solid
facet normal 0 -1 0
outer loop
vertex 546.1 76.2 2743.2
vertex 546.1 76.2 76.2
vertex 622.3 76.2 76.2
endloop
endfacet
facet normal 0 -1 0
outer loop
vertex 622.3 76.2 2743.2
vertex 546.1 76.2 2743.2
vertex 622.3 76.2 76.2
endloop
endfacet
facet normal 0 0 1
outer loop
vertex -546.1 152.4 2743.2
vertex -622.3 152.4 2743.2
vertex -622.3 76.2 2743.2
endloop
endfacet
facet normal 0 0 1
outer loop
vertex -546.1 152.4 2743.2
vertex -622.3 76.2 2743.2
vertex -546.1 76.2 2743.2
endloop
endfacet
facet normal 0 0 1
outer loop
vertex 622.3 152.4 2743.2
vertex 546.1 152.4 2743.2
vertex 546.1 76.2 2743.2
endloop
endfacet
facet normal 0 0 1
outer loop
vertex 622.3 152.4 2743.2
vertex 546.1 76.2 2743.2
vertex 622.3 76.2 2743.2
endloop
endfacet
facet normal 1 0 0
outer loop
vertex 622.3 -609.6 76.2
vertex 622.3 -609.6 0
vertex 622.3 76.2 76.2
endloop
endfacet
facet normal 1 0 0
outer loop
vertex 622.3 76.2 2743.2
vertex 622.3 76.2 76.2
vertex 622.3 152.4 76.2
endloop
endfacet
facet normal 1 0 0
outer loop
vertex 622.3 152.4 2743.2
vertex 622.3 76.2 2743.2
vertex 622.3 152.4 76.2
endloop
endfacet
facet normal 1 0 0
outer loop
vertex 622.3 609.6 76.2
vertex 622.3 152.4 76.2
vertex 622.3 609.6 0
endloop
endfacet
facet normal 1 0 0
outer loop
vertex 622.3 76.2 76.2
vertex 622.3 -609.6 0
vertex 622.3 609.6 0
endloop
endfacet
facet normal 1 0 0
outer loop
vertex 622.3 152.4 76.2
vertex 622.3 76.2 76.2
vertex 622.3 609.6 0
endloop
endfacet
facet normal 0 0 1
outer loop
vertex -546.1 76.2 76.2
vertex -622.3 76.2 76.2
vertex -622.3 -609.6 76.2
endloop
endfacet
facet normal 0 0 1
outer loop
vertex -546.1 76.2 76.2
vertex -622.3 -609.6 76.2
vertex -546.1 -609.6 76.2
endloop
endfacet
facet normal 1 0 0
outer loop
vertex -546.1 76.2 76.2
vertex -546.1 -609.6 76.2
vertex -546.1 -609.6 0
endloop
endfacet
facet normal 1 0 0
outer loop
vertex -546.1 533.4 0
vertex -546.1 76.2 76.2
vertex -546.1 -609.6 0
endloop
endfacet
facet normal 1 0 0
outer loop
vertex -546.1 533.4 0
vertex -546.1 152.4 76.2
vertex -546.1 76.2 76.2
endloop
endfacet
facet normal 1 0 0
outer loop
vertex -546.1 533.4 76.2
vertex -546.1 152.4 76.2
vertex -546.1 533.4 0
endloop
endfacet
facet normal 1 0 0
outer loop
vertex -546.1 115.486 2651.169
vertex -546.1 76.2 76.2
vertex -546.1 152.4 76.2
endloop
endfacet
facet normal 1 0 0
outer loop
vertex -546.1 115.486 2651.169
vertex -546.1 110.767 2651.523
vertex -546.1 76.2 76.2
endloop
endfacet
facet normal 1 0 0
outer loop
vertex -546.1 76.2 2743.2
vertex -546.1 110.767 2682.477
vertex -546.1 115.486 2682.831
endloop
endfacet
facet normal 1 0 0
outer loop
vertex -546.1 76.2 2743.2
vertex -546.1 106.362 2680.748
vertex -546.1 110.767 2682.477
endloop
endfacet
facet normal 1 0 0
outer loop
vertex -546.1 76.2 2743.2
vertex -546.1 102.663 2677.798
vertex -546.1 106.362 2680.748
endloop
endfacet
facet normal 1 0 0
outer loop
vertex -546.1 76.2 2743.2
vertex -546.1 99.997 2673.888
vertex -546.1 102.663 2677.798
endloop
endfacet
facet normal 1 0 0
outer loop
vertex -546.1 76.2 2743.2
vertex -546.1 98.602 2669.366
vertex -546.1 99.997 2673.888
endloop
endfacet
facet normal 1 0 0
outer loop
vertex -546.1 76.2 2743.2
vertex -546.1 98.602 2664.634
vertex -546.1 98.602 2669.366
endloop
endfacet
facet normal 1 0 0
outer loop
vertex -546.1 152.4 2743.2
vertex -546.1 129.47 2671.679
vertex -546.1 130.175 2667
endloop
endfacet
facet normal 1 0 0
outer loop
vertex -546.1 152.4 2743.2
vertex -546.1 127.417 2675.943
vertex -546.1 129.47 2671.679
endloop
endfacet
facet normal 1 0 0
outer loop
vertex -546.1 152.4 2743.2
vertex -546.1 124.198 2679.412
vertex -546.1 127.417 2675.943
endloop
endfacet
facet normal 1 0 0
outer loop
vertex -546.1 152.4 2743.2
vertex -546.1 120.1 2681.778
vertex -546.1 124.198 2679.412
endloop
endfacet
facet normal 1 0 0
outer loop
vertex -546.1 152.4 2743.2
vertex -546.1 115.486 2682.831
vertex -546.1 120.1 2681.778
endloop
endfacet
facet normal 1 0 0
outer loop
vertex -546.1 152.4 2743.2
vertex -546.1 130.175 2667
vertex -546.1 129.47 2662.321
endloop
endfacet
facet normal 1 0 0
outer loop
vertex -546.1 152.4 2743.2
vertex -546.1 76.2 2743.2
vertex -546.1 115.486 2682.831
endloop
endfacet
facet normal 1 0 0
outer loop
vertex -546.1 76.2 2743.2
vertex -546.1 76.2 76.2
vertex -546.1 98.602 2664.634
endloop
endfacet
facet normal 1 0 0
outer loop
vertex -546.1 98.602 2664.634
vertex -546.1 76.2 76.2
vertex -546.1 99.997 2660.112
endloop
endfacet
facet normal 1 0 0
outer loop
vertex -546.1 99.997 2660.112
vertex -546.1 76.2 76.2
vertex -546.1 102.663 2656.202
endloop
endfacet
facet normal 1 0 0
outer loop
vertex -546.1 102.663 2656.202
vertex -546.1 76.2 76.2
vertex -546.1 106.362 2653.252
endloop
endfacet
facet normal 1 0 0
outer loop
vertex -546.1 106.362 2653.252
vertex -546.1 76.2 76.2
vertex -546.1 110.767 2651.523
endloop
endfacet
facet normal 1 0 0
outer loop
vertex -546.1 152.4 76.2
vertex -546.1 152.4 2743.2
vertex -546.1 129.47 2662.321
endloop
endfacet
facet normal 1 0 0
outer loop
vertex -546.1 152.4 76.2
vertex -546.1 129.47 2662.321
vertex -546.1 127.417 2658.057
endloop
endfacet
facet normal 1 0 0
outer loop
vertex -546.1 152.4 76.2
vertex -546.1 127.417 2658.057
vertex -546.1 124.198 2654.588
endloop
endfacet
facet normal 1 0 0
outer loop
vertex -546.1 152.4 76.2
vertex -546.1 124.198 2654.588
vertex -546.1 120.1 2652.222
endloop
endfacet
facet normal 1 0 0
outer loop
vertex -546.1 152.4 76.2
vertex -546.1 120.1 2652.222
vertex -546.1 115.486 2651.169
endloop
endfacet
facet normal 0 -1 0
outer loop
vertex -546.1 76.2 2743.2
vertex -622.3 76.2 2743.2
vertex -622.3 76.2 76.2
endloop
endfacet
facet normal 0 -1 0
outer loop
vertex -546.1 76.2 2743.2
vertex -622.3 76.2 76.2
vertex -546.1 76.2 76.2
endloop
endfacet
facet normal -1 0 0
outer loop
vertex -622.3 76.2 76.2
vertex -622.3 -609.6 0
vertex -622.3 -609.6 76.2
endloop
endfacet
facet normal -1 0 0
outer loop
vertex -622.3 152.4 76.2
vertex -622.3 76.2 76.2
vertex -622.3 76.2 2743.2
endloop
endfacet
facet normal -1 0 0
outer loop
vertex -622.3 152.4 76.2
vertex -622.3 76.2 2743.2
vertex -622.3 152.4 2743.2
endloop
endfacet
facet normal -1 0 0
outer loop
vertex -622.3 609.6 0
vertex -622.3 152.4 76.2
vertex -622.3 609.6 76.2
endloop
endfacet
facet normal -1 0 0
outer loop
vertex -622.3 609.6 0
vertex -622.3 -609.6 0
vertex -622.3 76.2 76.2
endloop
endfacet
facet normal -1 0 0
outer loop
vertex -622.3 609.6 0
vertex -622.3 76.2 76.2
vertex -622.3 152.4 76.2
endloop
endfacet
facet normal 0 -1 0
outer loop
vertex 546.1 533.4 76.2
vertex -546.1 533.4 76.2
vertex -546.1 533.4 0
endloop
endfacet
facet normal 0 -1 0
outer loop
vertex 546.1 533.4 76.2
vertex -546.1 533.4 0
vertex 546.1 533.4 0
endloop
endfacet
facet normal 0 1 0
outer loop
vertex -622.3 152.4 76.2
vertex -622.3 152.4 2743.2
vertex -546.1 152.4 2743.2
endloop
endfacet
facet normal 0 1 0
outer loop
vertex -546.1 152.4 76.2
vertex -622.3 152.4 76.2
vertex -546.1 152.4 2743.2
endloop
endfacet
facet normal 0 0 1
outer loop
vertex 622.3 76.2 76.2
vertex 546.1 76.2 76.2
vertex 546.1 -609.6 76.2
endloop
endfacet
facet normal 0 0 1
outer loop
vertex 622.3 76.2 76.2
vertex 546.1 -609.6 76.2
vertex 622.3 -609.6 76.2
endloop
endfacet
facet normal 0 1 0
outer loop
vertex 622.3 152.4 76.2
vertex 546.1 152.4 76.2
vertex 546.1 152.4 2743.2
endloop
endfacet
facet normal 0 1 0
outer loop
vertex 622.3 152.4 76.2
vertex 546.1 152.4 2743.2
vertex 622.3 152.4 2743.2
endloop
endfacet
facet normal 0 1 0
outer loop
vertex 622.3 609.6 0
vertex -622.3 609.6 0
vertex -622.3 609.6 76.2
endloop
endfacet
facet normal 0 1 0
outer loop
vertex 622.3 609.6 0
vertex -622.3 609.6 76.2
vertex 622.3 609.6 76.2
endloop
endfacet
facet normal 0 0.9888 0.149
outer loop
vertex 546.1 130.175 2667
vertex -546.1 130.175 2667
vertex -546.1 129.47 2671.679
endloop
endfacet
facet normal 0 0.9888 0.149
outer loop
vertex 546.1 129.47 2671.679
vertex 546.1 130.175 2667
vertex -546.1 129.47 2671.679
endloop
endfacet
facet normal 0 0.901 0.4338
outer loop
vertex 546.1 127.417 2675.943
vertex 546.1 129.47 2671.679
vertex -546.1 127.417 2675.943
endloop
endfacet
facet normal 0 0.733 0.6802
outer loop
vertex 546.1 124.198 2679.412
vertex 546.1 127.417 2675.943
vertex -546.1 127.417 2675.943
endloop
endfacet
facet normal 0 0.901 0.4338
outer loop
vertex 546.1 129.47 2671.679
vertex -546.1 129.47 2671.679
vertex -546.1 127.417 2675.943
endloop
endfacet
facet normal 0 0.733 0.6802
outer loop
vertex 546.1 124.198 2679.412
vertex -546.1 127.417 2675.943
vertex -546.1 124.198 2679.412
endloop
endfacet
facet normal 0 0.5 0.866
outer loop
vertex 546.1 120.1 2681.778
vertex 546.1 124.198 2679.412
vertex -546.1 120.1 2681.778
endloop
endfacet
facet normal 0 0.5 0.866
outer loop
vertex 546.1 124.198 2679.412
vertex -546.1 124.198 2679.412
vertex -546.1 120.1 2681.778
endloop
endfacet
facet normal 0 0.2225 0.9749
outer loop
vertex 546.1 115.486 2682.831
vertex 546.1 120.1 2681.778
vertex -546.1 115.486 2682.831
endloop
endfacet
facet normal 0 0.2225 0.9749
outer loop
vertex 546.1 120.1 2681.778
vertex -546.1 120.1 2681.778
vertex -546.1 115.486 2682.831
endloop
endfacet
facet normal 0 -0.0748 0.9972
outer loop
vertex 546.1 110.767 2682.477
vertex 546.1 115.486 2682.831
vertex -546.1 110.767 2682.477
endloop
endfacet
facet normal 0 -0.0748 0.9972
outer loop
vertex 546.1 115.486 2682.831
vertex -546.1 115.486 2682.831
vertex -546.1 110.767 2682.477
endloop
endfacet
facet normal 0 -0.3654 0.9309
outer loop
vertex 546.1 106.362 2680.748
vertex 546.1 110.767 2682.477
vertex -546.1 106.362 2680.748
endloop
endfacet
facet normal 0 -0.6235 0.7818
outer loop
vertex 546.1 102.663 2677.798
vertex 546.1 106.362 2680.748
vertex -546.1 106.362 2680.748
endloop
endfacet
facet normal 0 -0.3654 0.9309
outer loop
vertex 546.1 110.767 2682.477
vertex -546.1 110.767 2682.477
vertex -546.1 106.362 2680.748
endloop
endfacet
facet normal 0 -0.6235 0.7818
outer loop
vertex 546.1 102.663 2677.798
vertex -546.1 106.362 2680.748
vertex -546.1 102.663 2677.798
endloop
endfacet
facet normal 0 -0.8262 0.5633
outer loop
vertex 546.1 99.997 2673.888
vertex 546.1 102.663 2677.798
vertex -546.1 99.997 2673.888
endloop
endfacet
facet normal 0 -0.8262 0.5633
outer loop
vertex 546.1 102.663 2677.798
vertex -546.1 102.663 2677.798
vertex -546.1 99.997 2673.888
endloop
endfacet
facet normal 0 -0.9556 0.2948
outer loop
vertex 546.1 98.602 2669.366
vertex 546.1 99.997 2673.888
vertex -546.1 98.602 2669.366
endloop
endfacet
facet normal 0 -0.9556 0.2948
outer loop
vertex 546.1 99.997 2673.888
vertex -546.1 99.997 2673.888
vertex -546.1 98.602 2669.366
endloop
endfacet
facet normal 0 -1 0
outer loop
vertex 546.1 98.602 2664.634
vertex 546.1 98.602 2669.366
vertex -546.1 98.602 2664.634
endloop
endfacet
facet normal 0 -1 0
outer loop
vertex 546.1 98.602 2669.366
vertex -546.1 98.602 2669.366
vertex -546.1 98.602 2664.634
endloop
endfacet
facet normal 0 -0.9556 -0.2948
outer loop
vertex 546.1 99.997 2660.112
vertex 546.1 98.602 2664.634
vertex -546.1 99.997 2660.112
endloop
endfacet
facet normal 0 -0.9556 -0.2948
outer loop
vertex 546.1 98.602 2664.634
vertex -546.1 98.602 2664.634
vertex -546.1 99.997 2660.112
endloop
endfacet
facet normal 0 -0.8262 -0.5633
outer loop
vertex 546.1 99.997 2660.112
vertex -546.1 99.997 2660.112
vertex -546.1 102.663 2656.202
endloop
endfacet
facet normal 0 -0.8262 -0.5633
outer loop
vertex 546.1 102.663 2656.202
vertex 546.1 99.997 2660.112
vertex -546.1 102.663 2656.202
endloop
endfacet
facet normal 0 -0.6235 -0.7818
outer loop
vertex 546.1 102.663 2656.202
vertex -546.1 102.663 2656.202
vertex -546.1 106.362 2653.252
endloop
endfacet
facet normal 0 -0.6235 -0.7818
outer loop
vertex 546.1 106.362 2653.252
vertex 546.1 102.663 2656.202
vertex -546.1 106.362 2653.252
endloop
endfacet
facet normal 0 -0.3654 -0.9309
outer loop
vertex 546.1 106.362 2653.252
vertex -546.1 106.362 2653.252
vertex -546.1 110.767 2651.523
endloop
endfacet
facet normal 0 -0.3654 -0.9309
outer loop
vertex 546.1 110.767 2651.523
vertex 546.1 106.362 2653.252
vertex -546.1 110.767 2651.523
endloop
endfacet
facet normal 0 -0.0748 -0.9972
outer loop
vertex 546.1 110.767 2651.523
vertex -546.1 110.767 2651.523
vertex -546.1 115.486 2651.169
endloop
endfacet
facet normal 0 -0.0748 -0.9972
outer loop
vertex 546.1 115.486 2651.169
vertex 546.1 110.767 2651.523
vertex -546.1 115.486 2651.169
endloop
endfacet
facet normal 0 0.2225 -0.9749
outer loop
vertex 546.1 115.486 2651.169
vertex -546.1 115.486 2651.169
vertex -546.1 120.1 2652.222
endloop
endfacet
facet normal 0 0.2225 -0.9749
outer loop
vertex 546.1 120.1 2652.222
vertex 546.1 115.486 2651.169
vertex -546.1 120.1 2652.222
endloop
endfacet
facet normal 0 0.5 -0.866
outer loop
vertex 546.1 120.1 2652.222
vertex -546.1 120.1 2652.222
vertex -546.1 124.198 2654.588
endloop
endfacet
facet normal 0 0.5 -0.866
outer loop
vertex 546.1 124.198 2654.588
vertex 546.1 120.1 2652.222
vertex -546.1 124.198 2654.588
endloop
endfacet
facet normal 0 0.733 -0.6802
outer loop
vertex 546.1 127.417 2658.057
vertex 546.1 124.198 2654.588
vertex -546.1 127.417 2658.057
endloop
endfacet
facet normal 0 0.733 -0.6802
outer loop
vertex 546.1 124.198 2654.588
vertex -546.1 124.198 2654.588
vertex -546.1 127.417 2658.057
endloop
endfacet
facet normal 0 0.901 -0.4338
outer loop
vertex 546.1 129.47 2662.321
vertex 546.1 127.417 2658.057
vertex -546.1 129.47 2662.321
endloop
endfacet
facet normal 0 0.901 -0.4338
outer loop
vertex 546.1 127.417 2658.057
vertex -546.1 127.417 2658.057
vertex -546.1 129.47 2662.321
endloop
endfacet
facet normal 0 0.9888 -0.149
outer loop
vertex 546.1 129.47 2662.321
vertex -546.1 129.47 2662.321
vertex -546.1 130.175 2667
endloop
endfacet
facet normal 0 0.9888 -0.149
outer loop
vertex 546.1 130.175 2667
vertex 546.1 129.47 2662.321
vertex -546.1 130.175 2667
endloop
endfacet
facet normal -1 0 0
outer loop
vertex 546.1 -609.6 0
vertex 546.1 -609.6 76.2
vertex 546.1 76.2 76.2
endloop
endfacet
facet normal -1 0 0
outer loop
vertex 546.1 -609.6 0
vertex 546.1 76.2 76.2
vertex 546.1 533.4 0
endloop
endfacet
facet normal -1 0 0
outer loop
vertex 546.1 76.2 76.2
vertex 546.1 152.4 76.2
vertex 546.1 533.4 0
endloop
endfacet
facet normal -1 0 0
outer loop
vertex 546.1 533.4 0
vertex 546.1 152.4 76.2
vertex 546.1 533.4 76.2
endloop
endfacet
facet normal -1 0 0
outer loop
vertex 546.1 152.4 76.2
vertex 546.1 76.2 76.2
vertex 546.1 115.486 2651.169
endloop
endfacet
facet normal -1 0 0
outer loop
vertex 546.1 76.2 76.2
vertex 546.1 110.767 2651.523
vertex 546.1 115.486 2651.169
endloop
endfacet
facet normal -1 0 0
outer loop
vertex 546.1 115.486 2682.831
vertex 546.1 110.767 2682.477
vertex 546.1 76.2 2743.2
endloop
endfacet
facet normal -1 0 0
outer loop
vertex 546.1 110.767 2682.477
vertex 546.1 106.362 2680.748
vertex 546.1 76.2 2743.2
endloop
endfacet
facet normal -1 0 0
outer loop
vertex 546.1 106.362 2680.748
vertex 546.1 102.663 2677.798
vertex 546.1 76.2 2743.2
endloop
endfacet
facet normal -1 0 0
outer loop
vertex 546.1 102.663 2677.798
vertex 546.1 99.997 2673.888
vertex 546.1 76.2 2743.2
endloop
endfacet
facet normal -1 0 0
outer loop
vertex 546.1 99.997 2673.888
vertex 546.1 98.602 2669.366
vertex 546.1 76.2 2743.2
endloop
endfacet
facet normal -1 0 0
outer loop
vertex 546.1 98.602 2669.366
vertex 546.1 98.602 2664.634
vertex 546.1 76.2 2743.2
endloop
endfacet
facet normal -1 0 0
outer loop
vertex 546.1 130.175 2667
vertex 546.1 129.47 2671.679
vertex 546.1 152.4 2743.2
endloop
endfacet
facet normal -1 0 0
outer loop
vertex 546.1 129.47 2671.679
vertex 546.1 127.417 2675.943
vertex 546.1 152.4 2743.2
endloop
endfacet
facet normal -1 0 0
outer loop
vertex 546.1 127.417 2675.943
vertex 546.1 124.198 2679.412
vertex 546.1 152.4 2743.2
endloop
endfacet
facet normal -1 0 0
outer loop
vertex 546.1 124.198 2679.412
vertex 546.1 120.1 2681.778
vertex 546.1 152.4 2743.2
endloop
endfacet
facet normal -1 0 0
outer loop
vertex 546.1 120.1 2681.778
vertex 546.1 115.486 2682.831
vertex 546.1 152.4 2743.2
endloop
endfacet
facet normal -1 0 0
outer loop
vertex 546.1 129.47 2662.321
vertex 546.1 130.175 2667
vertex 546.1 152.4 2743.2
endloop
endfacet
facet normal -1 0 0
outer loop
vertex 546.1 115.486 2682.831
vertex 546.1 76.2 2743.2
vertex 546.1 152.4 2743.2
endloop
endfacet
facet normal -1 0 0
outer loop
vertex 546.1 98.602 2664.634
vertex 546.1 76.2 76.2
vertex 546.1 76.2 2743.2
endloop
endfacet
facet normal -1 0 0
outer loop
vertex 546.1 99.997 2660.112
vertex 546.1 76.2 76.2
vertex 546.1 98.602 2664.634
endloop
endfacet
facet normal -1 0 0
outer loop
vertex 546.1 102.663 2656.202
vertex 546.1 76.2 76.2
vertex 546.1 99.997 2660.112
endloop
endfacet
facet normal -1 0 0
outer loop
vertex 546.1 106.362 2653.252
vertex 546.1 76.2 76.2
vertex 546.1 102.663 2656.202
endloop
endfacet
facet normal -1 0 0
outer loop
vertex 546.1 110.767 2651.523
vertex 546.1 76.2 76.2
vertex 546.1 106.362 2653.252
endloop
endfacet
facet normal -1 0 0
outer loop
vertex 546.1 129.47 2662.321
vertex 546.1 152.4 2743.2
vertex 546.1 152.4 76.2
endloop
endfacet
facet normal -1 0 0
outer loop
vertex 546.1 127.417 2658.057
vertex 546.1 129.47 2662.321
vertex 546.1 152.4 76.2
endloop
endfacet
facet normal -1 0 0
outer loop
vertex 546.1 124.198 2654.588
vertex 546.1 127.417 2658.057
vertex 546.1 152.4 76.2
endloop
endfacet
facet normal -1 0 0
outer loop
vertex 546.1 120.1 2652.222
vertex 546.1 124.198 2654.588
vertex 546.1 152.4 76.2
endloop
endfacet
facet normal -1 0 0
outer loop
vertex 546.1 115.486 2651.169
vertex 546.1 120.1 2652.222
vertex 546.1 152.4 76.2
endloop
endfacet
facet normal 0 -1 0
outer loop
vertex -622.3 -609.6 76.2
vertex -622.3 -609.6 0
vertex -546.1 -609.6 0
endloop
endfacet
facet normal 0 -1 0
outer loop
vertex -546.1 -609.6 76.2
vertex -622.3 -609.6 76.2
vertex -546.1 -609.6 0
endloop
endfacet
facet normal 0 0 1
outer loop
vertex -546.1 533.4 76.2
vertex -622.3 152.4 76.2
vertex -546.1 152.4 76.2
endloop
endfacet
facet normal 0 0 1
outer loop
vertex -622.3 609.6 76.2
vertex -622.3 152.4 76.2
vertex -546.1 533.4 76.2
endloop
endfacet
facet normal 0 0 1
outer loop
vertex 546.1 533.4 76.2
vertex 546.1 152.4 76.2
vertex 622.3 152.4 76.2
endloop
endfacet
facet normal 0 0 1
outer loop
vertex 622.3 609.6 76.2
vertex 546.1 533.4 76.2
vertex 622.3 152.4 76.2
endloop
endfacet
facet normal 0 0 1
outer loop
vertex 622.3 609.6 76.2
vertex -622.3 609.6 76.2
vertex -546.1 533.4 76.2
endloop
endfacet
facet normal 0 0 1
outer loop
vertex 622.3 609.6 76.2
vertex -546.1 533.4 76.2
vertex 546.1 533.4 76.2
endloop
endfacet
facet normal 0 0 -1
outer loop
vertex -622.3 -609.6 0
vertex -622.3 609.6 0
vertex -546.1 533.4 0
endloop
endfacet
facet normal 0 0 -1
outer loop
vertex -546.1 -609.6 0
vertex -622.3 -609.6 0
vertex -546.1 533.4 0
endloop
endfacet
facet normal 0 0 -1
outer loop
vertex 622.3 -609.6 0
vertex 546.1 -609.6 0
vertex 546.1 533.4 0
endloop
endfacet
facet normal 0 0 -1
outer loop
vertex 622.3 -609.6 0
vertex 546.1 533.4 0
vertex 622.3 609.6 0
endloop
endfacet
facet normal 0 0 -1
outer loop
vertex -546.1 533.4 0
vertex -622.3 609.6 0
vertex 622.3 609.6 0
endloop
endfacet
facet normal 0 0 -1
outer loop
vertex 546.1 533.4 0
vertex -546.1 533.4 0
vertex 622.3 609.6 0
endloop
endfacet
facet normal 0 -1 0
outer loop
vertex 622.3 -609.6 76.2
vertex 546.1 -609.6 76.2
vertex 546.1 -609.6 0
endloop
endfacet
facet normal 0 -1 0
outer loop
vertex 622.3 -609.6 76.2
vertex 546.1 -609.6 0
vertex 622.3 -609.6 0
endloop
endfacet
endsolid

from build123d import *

# Parameters (mm, degrees)
F0_W     = 1244.6
F0_H     = 1219.2
F1_DEPTH = 2743.2
F2_W     = 1092.2
F2_H     = 1143
F3_DEPTH = 2743.201
F4_W     = 1244.6
F4_H     = 457.2
F4_H_2   = 685.8
F5_DEPTH = 2667
F6_R     = 15.875
F7_DEPTH = 1092.2


with BuildPart() as f1:
    # F0 (on Top) → F1 (new body)
    with BuildSketch(Plane.XY):
        Rectangle(F0_W, F0_H)
    extrude(amount=F1_DEPTH)

    # F2 (on face) → F3 (cut, through all)
    with BuildSketch(Plane.XY.offset(2743.2)):
        with Locations((0, -38.1)):
            Rectangle(F2_W, F2_H)
    extrude(amount=-F3_DEPTH, mode=Mode.SUBTRACT)

    # F4 (on face) → F5 (cut)
    with BuildSketch(Plane.XY.offset(2743.2)):
        with Locations((0, 381)):
            Rectangle(F4_W, F4_H)
        with Locations((0, -266.7)):
            Rectangle(F4_W, F4_H_2)
    extrude(amount=-F5_DEPTH, mode=Mode.SUBTRACT)

    # F6 (on face) → F7 (join, through all)
    with BuildSketch(Plane.YZ.offset(-546.1)):
        with Locations((114.3, 2667)):
            Circle(F6_R)
    extrude(amount=F7_DEPTH)


solid = f1.part
